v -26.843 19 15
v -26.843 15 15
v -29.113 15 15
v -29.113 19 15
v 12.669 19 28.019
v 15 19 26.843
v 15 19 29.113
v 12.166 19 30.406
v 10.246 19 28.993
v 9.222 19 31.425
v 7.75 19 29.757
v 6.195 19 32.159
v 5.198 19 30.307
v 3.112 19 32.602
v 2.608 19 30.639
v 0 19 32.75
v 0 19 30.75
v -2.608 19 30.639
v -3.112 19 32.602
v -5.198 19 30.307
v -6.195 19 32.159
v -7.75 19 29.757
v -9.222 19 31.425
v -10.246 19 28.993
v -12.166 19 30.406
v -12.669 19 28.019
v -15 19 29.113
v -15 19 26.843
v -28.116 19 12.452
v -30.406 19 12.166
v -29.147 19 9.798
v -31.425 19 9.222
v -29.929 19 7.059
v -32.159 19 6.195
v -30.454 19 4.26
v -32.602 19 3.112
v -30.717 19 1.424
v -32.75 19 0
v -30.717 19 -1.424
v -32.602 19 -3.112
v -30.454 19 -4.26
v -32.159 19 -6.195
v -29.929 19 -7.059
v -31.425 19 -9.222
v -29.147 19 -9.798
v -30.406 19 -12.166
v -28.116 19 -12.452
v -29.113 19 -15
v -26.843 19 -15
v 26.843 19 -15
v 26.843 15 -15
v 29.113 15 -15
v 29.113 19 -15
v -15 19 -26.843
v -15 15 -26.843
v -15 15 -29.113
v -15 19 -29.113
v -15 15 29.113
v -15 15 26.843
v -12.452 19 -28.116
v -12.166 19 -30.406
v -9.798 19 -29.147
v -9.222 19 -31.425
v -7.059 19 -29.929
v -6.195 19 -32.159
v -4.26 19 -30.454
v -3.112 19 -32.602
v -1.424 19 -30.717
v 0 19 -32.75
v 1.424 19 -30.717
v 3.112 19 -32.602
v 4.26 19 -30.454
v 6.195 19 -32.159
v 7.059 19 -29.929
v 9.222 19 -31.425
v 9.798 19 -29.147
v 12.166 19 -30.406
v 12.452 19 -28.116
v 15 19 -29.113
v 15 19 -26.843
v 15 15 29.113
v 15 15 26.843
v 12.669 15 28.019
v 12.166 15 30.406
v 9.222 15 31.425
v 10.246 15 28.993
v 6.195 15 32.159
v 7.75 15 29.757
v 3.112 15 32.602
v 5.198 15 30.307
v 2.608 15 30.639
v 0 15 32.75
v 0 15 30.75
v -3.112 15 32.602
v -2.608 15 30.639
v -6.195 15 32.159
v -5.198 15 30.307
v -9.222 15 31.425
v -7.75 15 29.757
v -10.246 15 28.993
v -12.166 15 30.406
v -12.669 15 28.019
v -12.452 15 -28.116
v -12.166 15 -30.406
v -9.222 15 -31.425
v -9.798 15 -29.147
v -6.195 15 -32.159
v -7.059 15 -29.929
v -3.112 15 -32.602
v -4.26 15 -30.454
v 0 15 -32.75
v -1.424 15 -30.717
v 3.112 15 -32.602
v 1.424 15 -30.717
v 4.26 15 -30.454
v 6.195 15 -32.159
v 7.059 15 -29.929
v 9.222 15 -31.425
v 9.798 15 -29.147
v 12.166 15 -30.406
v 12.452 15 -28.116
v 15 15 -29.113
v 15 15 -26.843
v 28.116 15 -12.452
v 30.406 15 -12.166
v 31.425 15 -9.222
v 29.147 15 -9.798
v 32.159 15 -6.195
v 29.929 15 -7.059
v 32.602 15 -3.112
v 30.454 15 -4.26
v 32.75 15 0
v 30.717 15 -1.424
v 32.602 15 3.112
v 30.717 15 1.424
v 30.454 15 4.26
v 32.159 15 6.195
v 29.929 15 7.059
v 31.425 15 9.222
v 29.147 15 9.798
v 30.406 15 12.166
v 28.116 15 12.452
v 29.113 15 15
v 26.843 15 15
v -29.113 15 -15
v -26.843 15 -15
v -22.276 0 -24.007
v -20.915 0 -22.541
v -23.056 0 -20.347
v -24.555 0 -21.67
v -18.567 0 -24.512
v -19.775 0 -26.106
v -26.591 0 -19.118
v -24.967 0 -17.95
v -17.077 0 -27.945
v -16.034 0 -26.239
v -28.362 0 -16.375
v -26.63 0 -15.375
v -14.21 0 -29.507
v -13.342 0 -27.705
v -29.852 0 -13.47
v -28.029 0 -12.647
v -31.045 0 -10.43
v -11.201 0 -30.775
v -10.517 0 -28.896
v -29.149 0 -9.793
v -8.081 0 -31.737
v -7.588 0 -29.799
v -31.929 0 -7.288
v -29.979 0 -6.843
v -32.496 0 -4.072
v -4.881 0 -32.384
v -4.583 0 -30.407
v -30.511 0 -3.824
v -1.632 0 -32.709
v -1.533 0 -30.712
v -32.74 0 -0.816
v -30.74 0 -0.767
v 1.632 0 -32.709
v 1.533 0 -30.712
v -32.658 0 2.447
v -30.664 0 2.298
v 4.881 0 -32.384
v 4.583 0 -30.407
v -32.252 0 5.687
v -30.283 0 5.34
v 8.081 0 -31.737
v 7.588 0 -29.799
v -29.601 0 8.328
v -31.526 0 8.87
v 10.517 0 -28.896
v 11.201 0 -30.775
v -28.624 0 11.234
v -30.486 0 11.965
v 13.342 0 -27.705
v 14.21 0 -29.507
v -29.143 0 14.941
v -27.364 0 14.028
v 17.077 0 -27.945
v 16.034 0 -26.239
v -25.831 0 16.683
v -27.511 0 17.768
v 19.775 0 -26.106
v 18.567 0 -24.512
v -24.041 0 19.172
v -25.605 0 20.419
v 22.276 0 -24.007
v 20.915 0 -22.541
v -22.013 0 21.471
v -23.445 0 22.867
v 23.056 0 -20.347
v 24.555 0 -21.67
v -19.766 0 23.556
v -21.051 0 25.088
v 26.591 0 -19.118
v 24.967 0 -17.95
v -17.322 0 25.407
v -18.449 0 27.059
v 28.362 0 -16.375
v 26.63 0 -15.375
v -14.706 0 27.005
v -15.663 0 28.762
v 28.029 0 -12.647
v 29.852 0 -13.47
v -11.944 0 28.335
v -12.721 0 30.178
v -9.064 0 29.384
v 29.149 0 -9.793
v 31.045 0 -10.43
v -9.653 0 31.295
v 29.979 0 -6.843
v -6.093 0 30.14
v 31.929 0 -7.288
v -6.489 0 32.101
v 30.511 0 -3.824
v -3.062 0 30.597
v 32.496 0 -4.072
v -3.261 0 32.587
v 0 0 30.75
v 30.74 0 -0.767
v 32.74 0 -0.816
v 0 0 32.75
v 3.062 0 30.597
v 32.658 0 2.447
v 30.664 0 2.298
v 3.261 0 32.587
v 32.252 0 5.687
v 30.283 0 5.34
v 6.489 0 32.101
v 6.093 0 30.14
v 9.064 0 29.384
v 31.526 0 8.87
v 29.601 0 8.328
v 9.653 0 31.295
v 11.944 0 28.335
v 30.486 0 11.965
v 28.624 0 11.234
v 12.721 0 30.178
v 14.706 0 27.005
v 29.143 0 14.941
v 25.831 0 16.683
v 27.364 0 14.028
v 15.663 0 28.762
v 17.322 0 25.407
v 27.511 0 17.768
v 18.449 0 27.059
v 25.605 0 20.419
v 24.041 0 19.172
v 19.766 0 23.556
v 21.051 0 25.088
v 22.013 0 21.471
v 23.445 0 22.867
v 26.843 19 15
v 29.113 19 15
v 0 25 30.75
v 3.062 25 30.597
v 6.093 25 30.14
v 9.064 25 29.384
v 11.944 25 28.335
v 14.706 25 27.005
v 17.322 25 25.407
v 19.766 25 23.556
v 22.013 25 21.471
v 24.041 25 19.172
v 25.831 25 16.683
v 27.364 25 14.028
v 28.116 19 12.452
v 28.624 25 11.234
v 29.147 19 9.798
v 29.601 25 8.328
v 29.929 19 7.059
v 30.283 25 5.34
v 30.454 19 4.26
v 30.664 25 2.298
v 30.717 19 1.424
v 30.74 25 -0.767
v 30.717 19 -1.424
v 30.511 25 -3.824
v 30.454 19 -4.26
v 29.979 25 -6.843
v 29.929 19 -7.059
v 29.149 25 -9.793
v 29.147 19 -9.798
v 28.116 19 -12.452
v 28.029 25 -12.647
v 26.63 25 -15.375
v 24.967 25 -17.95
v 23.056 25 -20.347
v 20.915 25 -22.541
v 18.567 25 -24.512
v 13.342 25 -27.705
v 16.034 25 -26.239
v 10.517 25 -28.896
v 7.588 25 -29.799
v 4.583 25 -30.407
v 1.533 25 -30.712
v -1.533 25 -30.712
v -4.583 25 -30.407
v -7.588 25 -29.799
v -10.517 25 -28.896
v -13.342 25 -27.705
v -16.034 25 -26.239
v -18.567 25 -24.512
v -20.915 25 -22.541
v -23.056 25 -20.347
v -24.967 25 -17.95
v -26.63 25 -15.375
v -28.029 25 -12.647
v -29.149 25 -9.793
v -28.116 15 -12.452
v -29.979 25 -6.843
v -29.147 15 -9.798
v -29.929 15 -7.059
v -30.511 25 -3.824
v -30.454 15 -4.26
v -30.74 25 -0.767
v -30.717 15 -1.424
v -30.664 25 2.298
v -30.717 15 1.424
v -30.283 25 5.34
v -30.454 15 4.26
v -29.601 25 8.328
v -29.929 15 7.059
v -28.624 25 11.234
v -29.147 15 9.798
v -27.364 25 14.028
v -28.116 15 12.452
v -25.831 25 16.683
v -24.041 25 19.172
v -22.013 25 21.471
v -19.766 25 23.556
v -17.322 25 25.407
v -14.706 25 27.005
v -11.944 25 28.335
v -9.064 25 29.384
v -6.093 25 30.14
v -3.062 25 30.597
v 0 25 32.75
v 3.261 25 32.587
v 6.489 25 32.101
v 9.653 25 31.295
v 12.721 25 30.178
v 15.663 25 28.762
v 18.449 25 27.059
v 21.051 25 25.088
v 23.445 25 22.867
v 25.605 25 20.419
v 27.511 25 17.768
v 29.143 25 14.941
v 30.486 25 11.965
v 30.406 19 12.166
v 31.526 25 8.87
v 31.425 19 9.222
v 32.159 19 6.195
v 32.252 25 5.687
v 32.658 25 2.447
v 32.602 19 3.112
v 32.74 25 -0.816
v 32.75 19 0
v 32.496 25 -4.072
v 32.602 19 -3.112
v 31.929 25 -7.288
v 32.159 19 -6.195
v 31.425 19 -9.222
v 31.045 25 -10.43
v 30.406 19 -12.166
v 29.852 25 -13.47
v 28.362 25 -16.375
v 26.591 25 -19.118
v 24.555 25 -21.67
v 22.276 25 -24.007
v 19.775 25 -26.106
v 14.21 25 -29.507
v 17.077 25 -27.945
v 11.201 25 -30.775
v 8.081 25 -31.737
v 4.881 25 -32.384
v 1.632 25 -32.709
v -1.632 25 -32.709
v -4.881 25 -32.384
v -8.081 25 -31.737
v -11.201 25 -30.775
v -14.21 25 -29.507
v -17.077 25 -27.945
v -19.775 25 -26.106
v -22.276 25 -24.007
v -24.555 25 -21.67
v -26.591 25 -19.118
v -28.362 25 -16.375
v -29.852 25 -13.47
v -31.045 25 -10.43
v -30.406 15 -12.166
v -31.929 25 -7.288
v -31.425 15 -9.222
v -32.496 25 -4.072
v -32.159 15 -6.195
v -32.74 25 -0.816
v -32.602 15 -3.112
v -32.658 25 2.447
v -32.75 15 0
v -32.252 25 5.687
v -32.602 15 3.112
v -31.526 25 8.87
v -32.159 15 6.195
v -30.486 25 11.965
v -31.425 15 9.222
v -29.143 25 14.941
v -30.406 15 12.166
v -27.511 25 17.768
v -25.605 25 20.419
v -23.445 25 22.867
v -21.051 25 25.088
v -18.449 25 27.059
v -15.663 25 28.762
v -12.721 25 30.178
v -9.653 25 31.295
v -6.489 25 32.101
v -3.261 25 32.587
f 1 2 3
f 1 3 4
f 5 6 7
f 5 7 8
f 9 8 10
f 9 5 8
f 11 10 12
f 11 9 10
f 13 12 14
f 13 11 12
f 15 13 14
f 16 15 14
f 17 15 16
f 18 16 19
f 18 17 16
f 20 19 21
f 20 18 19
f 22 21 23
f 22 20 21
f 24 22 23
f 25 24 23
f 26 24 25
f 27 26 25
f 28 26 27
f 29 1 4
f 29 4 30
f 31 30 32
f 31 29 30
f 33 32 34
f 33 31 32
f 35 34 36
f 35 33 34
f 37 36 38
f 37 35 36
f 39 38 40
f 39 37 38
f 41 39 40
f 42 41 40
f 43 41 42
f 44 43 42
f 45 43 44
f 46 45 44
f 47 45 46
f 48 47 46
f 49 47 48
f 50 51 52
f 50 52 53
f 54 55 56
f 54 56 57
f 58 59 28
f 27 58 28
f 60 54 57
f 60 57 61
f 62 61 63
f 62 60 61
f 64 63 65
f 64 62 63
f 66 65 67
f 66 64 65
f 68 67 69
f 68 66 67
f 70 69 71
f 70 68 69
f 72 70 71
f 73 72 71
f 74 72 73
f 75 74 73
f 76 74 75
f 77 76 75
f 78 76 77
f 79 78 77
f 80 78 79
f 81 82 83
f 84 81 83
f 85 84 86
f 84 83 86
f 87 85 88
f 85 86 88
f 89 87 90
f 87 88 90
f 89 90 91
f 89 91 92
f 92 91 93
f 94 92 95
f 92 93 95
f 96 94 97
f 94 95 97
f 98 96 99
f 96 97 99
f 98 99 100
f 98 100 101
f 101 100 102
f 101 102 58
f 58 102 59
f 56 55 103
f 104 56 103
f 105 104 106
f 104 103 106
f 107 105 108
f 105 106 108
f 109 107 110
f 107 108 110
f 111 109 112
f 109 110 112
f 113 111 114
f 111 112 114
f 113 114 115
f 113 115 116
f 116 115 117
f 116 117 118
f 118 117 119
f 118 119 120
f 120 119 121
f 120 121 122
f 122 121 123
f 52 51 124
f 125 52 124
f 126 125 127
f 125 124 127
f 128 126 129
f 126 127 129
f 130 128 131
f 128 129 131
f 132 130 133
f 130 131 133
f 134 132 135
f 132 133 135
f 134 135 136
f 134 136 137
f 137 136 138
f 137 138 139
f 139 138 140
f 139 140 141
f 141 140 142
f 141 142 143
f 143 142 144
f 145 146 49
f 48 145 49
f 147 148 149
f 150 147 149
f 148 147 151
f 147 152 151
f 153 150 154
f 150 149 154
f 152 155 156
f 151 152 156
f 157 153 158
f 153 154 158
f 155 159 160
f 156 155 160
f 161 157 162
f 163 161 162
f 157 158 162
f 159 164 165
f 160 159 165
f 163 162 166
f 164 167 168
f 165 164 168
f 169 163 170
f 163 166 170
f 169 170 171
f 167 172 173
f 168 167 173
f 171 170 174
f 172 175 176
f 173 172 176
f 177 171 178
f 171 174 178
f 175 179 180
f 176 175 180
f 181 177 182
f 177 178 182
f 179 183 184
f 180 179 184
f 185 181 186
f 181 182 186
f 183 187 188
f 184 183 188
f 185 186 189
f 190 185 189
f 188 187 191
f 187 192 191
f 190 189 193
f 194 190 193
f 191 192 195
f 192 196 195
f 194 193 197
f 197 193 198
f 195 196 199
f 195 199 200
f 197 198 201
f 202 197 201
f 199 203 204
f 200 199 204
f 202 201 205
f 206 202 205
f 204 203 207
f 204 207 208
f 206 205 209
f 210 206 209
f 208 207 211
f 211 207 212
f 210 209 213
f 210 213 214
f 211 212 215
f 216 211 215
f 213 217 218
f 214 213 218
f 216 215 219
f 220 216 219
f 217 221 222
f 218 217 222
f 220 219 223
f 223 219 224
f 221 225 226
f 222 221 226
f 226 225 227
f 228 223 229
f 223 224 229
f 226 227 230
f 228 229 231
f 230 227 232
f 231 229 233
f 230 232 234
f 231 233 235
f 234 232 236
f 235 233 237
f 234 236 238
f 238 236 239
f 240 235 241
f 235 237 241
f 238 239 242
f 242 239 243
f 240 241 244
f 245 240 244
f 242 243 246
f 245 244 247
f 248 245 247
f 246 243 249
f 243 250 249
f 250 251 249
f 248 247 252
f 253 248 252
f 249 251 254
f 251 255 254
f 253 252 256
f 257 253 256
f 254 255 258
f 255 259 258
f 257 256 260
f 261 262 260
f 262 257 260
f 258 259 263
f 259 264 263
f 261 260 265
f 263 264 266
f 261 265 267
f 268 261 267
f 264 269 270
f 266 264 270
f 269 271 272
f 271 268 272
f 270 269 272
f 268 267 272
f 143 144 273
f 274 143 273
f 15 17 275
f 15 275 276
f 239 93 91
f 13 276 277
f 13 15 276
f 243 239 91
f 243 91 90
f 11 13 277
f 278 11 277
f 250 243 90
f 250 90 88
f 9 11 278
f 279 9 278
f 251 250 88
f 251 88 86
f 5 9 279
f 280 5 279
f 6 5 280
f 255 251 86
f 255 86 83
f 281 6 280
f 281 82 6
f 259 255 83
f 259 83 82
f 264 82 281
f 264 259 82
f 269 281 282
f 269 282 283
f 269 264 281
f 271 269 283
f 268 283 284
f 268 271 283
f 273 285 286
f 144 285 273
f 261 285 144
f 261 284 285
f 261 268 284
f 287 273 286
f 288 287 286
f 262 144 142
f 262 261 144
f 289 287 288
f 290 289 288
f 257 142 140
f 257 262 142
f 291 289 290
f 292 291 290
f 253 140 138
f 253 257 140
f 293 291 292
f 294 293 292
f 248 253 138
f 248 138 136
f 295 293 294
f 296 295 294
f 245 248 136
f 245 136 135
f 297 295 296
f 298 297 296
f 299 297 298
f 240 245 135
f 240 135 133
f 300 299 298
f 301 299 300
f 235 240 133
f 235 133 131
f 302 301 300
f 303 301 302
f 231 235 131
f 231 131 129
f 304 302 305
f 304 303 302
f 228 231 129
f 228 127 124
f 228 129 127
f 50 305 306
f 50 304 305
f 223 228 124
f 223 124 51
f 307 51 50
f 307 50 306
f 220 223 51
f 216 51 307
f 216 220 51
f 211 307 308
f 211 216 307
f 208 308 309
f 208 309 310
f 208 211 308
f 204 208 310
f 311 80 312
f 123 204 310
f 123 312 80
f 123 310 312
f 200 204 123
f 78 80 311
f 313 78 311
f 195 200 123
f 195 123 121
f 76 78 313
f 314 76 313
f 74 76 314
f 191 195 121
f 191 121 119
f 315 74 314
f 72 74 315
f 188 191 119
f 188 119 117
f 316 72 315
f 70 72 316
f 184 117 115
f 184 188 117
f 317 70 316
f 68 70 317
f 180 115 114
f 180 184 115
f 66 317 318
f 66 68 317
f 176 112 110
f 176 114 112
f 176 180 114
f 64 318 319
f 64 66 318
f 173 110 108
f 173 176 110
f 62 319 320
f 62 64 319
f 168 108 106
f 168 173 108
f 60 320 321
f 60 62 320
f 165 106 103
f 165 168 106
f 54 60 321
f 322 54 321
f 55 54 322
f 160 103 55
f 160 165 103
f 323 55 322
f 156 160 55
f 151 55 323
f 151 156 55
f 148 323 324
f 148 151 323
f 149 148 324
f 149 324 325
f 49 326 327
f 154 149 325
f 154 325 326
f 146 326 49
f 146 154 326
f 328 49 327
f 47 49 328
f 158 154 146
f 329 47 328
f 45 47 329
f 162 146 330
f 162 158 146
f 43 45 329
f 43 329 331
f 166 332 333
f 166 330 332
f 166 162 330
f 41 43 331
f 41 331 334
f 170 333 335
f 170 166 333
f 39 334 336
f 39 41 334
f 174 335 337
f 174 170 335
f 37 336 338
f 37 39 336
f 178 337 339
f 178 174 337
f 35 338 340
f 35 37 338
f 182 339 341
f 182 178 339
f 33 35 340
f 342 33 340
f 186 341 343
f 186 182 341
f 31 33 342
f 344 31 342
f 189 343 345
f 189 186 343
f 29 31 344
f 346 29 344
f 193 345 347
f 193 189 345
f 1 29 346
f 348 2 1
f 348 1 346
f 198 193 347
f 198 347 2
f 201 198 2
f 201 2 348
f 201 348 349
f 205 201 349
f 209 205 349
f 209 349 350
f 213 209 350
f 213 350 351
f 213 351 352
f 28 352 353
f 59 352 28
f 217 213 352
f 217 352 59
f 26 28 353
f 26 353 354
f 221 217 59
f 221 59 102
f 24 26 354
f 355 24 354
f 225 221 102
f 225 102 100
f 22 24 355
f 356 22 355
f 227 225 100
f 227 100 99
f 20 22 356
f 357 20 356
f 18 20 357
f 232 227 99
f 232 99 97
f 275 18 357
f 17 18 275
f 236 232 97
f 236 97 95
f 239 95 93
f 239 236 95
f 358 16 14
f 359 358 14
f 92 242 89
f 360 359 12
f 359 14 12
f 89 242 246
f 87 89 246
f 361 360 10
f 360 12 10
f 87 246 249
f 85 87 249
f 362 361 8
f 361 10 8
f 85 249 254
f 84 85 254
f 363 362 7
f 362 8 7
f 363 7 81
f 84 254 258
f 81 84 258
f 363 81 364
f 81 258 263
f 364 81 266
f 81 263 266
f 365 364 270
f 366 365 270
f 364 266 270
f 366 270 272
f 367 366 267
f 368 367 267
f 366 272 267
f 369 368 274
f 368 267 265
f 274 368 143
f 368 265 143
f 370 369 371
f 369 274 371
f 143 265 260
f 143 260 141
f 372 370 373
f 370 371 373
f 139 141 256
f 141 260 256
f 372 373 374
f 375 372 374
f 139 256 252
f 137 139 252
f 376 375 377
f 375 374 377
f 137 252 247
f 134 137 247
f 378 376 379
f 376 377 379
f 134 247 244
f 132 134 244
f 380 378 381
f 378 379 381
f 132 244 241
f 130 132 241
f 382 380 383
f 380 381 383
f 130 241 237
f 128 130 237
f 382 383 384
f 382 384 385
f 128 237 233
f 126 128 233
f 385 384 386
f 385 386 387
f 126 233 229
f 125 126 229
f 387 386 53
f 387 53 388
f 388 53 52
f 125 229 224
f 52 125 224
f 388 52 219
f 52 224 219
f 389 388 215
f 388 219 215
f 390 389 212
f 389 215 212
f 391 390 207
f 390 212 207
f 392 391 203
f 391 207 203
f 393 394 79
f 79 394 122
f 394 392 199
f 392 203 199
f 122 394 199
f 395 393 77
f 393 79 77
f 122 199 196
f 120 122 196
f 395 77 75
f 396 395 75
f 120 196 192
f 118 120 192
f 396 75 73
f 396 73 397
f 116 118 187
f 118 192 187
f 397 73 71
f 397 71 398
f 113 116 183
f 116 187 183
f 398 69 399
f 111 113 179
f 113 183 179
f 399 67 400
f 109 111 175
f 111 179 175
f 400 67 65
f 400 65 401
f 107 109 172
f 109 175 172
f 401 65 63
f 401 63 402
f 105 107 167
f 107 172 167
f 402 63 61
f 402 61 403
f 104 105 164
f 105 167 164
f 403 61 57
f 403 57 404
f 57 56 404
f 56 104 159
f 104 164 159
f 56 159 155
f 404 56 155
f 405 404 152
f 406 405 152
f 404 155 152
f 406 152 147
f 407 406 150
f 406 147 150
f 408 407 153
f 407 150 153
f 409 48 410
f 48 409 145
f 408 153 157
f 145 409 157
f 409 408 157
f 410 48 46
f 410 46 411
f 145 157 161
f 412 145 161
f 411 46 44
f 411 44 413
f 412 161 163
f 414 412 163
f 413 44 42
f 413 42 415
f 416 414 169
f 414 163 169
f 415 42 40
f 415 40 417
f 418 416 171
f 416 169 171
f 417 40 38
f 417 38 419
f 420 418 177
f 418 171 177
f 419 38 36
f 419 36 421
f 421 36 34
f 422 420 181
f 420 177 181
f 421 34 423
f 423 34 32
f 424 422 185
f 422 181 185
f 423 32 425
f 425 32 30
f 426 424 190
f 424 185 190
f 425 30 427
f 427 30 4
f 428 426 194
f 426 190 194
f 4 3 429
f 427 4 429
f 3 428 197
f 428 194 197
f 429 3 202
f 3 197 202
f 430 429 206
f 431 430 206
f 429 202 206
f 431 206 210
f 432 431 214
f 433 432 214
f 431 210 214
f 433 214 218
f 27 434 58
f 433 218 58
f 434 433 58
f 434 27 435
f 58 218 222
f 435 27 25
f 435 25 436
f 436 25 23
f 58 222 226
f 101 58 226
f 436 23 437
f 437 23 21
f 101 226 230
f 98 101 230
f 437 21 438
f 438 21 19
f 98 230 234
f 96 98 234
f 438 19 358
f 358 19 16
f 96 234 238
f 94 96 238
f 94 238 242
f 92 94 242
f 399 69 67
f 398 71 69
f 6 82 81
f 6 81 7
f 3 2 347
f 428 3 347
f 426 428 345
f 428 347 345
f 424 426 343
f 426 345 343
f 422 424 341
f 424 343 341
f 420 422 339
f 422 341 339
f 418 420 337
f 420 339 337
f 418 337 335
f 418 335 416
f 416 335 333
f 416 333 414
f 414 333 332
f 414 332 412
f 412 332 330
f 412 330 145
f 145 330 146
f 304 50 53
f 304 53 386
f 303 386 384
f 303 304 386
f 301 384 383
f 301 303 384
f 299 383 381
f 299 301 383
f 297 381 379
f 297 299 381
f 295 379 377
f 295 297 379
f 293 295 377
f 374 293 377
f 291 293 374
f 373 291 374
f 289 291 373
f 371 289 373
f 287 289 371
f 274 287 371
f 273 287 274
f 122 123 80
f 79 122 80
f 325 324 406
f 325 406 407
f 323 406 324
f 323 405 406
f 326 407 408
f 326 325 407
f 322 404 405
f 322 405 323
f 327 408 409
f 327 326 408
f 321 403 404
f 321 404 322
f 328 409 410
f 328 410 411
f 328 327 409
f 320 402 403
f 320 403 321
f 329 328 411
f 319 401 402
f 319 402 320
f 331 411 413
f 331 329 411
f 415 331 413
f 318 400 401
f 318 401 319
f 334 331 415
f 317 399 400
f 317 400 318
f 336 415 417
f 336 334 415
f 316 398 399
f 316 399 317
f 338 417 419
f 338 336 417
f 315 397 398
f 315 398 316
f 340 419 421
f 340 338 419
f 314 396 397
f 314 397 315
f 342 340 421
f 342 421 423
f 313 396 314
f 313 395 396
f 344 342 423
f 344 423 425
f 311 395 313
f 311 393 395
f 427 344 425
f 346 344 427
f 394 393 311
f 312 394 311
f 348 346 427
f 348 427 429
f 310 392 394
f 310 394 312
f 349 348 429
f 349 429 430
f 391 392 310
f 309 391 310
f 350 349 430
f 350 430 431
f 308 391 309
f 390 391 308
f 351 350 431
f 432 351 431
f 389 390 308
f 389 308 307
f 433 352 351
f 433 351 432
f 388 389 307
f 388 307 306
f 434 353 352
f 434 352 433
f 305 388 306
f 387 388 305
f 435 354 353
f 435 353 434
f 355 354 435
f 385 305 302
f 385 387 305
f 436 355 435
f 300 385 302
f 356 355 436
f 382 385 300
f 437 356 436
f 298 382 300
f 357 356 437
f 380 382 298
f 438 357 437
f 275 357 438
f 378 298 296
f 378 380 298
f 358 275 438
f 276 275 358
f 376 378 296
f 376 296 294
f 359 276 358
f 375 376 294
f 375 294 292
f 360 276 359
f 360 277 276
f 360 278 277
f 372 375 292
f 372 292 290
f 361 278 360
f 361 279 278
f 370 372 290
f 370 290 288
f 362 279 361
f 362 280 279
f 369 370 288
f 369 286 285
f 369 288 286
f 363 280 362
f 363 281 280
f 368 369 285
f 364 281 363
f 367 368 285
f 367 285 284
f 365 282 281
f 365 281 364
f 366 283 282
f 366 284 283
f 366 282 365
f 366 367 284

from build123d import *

# Parameters (mm, degrees)
ESQUISSE1_R                  = 32.75
ESQUISSE1_R_2                = 30.75
BOSS_EXTRU_1_DEPTH           = 25
ESQUISSE2_W                  = 30
ESQUISSE2_H                  = 4
ENL_V_MAT_EXTRU_1_DEPTH      = 53.631976972
R_P_TITION_CIRCULAIRE1_COUNT = 4


with BuildPart() as part:
    # Esquisse1 → Boss.-Extru.1 (new body)
    with BuildSketch(Plane(origin=(0, 0, 0), x_dir=(1, 0, 0), z_dir=(0, 1, 0))):
        with Locations(Location((0, 0, 0), (0, 0, 270))):
            Circle(ESQUISSE1_R)
        with Locations(Location((0, 0, 0), (0, 0, 270))):
            Circle(ESQUISSE1_R_2, mode=Mode.SUBTRACT)
    extrude(amount=BOSS_EXTRU_1_DEPTH)

    # Esquisse2 → Enlèv. mat.-Extru.1 (cut, through all)
    with BuildSketch(Plane.XY):
        with Locations((0, 17)):
            Rectangle(ESQUISSE2_W, ESQUISSE2_H)
    enl_v_mat_extru_1 = extrude(amount=-ENL_V_MAT_EXTRU_1_DEPTH, mode=Mode.SUBTRACT)

    # Répétition circulaire1: Enlèv. mat.-Extru.1 ×4 about axis
    r_p_tition_circulaire1_axis = Axis((0, 0, 0), (0, 1, 0))
    for i in range(1, R_P_TITION_CIRCULAIRE1_COUNT):
        add(enl_v_mat_extru_1.rotate(r_p_tition_circulaire1_axis, i * 360 / R_P_TITION_CIRCULAIRE1_COUNT), mode=Mode.SUBTRACT)


solid = part.part
